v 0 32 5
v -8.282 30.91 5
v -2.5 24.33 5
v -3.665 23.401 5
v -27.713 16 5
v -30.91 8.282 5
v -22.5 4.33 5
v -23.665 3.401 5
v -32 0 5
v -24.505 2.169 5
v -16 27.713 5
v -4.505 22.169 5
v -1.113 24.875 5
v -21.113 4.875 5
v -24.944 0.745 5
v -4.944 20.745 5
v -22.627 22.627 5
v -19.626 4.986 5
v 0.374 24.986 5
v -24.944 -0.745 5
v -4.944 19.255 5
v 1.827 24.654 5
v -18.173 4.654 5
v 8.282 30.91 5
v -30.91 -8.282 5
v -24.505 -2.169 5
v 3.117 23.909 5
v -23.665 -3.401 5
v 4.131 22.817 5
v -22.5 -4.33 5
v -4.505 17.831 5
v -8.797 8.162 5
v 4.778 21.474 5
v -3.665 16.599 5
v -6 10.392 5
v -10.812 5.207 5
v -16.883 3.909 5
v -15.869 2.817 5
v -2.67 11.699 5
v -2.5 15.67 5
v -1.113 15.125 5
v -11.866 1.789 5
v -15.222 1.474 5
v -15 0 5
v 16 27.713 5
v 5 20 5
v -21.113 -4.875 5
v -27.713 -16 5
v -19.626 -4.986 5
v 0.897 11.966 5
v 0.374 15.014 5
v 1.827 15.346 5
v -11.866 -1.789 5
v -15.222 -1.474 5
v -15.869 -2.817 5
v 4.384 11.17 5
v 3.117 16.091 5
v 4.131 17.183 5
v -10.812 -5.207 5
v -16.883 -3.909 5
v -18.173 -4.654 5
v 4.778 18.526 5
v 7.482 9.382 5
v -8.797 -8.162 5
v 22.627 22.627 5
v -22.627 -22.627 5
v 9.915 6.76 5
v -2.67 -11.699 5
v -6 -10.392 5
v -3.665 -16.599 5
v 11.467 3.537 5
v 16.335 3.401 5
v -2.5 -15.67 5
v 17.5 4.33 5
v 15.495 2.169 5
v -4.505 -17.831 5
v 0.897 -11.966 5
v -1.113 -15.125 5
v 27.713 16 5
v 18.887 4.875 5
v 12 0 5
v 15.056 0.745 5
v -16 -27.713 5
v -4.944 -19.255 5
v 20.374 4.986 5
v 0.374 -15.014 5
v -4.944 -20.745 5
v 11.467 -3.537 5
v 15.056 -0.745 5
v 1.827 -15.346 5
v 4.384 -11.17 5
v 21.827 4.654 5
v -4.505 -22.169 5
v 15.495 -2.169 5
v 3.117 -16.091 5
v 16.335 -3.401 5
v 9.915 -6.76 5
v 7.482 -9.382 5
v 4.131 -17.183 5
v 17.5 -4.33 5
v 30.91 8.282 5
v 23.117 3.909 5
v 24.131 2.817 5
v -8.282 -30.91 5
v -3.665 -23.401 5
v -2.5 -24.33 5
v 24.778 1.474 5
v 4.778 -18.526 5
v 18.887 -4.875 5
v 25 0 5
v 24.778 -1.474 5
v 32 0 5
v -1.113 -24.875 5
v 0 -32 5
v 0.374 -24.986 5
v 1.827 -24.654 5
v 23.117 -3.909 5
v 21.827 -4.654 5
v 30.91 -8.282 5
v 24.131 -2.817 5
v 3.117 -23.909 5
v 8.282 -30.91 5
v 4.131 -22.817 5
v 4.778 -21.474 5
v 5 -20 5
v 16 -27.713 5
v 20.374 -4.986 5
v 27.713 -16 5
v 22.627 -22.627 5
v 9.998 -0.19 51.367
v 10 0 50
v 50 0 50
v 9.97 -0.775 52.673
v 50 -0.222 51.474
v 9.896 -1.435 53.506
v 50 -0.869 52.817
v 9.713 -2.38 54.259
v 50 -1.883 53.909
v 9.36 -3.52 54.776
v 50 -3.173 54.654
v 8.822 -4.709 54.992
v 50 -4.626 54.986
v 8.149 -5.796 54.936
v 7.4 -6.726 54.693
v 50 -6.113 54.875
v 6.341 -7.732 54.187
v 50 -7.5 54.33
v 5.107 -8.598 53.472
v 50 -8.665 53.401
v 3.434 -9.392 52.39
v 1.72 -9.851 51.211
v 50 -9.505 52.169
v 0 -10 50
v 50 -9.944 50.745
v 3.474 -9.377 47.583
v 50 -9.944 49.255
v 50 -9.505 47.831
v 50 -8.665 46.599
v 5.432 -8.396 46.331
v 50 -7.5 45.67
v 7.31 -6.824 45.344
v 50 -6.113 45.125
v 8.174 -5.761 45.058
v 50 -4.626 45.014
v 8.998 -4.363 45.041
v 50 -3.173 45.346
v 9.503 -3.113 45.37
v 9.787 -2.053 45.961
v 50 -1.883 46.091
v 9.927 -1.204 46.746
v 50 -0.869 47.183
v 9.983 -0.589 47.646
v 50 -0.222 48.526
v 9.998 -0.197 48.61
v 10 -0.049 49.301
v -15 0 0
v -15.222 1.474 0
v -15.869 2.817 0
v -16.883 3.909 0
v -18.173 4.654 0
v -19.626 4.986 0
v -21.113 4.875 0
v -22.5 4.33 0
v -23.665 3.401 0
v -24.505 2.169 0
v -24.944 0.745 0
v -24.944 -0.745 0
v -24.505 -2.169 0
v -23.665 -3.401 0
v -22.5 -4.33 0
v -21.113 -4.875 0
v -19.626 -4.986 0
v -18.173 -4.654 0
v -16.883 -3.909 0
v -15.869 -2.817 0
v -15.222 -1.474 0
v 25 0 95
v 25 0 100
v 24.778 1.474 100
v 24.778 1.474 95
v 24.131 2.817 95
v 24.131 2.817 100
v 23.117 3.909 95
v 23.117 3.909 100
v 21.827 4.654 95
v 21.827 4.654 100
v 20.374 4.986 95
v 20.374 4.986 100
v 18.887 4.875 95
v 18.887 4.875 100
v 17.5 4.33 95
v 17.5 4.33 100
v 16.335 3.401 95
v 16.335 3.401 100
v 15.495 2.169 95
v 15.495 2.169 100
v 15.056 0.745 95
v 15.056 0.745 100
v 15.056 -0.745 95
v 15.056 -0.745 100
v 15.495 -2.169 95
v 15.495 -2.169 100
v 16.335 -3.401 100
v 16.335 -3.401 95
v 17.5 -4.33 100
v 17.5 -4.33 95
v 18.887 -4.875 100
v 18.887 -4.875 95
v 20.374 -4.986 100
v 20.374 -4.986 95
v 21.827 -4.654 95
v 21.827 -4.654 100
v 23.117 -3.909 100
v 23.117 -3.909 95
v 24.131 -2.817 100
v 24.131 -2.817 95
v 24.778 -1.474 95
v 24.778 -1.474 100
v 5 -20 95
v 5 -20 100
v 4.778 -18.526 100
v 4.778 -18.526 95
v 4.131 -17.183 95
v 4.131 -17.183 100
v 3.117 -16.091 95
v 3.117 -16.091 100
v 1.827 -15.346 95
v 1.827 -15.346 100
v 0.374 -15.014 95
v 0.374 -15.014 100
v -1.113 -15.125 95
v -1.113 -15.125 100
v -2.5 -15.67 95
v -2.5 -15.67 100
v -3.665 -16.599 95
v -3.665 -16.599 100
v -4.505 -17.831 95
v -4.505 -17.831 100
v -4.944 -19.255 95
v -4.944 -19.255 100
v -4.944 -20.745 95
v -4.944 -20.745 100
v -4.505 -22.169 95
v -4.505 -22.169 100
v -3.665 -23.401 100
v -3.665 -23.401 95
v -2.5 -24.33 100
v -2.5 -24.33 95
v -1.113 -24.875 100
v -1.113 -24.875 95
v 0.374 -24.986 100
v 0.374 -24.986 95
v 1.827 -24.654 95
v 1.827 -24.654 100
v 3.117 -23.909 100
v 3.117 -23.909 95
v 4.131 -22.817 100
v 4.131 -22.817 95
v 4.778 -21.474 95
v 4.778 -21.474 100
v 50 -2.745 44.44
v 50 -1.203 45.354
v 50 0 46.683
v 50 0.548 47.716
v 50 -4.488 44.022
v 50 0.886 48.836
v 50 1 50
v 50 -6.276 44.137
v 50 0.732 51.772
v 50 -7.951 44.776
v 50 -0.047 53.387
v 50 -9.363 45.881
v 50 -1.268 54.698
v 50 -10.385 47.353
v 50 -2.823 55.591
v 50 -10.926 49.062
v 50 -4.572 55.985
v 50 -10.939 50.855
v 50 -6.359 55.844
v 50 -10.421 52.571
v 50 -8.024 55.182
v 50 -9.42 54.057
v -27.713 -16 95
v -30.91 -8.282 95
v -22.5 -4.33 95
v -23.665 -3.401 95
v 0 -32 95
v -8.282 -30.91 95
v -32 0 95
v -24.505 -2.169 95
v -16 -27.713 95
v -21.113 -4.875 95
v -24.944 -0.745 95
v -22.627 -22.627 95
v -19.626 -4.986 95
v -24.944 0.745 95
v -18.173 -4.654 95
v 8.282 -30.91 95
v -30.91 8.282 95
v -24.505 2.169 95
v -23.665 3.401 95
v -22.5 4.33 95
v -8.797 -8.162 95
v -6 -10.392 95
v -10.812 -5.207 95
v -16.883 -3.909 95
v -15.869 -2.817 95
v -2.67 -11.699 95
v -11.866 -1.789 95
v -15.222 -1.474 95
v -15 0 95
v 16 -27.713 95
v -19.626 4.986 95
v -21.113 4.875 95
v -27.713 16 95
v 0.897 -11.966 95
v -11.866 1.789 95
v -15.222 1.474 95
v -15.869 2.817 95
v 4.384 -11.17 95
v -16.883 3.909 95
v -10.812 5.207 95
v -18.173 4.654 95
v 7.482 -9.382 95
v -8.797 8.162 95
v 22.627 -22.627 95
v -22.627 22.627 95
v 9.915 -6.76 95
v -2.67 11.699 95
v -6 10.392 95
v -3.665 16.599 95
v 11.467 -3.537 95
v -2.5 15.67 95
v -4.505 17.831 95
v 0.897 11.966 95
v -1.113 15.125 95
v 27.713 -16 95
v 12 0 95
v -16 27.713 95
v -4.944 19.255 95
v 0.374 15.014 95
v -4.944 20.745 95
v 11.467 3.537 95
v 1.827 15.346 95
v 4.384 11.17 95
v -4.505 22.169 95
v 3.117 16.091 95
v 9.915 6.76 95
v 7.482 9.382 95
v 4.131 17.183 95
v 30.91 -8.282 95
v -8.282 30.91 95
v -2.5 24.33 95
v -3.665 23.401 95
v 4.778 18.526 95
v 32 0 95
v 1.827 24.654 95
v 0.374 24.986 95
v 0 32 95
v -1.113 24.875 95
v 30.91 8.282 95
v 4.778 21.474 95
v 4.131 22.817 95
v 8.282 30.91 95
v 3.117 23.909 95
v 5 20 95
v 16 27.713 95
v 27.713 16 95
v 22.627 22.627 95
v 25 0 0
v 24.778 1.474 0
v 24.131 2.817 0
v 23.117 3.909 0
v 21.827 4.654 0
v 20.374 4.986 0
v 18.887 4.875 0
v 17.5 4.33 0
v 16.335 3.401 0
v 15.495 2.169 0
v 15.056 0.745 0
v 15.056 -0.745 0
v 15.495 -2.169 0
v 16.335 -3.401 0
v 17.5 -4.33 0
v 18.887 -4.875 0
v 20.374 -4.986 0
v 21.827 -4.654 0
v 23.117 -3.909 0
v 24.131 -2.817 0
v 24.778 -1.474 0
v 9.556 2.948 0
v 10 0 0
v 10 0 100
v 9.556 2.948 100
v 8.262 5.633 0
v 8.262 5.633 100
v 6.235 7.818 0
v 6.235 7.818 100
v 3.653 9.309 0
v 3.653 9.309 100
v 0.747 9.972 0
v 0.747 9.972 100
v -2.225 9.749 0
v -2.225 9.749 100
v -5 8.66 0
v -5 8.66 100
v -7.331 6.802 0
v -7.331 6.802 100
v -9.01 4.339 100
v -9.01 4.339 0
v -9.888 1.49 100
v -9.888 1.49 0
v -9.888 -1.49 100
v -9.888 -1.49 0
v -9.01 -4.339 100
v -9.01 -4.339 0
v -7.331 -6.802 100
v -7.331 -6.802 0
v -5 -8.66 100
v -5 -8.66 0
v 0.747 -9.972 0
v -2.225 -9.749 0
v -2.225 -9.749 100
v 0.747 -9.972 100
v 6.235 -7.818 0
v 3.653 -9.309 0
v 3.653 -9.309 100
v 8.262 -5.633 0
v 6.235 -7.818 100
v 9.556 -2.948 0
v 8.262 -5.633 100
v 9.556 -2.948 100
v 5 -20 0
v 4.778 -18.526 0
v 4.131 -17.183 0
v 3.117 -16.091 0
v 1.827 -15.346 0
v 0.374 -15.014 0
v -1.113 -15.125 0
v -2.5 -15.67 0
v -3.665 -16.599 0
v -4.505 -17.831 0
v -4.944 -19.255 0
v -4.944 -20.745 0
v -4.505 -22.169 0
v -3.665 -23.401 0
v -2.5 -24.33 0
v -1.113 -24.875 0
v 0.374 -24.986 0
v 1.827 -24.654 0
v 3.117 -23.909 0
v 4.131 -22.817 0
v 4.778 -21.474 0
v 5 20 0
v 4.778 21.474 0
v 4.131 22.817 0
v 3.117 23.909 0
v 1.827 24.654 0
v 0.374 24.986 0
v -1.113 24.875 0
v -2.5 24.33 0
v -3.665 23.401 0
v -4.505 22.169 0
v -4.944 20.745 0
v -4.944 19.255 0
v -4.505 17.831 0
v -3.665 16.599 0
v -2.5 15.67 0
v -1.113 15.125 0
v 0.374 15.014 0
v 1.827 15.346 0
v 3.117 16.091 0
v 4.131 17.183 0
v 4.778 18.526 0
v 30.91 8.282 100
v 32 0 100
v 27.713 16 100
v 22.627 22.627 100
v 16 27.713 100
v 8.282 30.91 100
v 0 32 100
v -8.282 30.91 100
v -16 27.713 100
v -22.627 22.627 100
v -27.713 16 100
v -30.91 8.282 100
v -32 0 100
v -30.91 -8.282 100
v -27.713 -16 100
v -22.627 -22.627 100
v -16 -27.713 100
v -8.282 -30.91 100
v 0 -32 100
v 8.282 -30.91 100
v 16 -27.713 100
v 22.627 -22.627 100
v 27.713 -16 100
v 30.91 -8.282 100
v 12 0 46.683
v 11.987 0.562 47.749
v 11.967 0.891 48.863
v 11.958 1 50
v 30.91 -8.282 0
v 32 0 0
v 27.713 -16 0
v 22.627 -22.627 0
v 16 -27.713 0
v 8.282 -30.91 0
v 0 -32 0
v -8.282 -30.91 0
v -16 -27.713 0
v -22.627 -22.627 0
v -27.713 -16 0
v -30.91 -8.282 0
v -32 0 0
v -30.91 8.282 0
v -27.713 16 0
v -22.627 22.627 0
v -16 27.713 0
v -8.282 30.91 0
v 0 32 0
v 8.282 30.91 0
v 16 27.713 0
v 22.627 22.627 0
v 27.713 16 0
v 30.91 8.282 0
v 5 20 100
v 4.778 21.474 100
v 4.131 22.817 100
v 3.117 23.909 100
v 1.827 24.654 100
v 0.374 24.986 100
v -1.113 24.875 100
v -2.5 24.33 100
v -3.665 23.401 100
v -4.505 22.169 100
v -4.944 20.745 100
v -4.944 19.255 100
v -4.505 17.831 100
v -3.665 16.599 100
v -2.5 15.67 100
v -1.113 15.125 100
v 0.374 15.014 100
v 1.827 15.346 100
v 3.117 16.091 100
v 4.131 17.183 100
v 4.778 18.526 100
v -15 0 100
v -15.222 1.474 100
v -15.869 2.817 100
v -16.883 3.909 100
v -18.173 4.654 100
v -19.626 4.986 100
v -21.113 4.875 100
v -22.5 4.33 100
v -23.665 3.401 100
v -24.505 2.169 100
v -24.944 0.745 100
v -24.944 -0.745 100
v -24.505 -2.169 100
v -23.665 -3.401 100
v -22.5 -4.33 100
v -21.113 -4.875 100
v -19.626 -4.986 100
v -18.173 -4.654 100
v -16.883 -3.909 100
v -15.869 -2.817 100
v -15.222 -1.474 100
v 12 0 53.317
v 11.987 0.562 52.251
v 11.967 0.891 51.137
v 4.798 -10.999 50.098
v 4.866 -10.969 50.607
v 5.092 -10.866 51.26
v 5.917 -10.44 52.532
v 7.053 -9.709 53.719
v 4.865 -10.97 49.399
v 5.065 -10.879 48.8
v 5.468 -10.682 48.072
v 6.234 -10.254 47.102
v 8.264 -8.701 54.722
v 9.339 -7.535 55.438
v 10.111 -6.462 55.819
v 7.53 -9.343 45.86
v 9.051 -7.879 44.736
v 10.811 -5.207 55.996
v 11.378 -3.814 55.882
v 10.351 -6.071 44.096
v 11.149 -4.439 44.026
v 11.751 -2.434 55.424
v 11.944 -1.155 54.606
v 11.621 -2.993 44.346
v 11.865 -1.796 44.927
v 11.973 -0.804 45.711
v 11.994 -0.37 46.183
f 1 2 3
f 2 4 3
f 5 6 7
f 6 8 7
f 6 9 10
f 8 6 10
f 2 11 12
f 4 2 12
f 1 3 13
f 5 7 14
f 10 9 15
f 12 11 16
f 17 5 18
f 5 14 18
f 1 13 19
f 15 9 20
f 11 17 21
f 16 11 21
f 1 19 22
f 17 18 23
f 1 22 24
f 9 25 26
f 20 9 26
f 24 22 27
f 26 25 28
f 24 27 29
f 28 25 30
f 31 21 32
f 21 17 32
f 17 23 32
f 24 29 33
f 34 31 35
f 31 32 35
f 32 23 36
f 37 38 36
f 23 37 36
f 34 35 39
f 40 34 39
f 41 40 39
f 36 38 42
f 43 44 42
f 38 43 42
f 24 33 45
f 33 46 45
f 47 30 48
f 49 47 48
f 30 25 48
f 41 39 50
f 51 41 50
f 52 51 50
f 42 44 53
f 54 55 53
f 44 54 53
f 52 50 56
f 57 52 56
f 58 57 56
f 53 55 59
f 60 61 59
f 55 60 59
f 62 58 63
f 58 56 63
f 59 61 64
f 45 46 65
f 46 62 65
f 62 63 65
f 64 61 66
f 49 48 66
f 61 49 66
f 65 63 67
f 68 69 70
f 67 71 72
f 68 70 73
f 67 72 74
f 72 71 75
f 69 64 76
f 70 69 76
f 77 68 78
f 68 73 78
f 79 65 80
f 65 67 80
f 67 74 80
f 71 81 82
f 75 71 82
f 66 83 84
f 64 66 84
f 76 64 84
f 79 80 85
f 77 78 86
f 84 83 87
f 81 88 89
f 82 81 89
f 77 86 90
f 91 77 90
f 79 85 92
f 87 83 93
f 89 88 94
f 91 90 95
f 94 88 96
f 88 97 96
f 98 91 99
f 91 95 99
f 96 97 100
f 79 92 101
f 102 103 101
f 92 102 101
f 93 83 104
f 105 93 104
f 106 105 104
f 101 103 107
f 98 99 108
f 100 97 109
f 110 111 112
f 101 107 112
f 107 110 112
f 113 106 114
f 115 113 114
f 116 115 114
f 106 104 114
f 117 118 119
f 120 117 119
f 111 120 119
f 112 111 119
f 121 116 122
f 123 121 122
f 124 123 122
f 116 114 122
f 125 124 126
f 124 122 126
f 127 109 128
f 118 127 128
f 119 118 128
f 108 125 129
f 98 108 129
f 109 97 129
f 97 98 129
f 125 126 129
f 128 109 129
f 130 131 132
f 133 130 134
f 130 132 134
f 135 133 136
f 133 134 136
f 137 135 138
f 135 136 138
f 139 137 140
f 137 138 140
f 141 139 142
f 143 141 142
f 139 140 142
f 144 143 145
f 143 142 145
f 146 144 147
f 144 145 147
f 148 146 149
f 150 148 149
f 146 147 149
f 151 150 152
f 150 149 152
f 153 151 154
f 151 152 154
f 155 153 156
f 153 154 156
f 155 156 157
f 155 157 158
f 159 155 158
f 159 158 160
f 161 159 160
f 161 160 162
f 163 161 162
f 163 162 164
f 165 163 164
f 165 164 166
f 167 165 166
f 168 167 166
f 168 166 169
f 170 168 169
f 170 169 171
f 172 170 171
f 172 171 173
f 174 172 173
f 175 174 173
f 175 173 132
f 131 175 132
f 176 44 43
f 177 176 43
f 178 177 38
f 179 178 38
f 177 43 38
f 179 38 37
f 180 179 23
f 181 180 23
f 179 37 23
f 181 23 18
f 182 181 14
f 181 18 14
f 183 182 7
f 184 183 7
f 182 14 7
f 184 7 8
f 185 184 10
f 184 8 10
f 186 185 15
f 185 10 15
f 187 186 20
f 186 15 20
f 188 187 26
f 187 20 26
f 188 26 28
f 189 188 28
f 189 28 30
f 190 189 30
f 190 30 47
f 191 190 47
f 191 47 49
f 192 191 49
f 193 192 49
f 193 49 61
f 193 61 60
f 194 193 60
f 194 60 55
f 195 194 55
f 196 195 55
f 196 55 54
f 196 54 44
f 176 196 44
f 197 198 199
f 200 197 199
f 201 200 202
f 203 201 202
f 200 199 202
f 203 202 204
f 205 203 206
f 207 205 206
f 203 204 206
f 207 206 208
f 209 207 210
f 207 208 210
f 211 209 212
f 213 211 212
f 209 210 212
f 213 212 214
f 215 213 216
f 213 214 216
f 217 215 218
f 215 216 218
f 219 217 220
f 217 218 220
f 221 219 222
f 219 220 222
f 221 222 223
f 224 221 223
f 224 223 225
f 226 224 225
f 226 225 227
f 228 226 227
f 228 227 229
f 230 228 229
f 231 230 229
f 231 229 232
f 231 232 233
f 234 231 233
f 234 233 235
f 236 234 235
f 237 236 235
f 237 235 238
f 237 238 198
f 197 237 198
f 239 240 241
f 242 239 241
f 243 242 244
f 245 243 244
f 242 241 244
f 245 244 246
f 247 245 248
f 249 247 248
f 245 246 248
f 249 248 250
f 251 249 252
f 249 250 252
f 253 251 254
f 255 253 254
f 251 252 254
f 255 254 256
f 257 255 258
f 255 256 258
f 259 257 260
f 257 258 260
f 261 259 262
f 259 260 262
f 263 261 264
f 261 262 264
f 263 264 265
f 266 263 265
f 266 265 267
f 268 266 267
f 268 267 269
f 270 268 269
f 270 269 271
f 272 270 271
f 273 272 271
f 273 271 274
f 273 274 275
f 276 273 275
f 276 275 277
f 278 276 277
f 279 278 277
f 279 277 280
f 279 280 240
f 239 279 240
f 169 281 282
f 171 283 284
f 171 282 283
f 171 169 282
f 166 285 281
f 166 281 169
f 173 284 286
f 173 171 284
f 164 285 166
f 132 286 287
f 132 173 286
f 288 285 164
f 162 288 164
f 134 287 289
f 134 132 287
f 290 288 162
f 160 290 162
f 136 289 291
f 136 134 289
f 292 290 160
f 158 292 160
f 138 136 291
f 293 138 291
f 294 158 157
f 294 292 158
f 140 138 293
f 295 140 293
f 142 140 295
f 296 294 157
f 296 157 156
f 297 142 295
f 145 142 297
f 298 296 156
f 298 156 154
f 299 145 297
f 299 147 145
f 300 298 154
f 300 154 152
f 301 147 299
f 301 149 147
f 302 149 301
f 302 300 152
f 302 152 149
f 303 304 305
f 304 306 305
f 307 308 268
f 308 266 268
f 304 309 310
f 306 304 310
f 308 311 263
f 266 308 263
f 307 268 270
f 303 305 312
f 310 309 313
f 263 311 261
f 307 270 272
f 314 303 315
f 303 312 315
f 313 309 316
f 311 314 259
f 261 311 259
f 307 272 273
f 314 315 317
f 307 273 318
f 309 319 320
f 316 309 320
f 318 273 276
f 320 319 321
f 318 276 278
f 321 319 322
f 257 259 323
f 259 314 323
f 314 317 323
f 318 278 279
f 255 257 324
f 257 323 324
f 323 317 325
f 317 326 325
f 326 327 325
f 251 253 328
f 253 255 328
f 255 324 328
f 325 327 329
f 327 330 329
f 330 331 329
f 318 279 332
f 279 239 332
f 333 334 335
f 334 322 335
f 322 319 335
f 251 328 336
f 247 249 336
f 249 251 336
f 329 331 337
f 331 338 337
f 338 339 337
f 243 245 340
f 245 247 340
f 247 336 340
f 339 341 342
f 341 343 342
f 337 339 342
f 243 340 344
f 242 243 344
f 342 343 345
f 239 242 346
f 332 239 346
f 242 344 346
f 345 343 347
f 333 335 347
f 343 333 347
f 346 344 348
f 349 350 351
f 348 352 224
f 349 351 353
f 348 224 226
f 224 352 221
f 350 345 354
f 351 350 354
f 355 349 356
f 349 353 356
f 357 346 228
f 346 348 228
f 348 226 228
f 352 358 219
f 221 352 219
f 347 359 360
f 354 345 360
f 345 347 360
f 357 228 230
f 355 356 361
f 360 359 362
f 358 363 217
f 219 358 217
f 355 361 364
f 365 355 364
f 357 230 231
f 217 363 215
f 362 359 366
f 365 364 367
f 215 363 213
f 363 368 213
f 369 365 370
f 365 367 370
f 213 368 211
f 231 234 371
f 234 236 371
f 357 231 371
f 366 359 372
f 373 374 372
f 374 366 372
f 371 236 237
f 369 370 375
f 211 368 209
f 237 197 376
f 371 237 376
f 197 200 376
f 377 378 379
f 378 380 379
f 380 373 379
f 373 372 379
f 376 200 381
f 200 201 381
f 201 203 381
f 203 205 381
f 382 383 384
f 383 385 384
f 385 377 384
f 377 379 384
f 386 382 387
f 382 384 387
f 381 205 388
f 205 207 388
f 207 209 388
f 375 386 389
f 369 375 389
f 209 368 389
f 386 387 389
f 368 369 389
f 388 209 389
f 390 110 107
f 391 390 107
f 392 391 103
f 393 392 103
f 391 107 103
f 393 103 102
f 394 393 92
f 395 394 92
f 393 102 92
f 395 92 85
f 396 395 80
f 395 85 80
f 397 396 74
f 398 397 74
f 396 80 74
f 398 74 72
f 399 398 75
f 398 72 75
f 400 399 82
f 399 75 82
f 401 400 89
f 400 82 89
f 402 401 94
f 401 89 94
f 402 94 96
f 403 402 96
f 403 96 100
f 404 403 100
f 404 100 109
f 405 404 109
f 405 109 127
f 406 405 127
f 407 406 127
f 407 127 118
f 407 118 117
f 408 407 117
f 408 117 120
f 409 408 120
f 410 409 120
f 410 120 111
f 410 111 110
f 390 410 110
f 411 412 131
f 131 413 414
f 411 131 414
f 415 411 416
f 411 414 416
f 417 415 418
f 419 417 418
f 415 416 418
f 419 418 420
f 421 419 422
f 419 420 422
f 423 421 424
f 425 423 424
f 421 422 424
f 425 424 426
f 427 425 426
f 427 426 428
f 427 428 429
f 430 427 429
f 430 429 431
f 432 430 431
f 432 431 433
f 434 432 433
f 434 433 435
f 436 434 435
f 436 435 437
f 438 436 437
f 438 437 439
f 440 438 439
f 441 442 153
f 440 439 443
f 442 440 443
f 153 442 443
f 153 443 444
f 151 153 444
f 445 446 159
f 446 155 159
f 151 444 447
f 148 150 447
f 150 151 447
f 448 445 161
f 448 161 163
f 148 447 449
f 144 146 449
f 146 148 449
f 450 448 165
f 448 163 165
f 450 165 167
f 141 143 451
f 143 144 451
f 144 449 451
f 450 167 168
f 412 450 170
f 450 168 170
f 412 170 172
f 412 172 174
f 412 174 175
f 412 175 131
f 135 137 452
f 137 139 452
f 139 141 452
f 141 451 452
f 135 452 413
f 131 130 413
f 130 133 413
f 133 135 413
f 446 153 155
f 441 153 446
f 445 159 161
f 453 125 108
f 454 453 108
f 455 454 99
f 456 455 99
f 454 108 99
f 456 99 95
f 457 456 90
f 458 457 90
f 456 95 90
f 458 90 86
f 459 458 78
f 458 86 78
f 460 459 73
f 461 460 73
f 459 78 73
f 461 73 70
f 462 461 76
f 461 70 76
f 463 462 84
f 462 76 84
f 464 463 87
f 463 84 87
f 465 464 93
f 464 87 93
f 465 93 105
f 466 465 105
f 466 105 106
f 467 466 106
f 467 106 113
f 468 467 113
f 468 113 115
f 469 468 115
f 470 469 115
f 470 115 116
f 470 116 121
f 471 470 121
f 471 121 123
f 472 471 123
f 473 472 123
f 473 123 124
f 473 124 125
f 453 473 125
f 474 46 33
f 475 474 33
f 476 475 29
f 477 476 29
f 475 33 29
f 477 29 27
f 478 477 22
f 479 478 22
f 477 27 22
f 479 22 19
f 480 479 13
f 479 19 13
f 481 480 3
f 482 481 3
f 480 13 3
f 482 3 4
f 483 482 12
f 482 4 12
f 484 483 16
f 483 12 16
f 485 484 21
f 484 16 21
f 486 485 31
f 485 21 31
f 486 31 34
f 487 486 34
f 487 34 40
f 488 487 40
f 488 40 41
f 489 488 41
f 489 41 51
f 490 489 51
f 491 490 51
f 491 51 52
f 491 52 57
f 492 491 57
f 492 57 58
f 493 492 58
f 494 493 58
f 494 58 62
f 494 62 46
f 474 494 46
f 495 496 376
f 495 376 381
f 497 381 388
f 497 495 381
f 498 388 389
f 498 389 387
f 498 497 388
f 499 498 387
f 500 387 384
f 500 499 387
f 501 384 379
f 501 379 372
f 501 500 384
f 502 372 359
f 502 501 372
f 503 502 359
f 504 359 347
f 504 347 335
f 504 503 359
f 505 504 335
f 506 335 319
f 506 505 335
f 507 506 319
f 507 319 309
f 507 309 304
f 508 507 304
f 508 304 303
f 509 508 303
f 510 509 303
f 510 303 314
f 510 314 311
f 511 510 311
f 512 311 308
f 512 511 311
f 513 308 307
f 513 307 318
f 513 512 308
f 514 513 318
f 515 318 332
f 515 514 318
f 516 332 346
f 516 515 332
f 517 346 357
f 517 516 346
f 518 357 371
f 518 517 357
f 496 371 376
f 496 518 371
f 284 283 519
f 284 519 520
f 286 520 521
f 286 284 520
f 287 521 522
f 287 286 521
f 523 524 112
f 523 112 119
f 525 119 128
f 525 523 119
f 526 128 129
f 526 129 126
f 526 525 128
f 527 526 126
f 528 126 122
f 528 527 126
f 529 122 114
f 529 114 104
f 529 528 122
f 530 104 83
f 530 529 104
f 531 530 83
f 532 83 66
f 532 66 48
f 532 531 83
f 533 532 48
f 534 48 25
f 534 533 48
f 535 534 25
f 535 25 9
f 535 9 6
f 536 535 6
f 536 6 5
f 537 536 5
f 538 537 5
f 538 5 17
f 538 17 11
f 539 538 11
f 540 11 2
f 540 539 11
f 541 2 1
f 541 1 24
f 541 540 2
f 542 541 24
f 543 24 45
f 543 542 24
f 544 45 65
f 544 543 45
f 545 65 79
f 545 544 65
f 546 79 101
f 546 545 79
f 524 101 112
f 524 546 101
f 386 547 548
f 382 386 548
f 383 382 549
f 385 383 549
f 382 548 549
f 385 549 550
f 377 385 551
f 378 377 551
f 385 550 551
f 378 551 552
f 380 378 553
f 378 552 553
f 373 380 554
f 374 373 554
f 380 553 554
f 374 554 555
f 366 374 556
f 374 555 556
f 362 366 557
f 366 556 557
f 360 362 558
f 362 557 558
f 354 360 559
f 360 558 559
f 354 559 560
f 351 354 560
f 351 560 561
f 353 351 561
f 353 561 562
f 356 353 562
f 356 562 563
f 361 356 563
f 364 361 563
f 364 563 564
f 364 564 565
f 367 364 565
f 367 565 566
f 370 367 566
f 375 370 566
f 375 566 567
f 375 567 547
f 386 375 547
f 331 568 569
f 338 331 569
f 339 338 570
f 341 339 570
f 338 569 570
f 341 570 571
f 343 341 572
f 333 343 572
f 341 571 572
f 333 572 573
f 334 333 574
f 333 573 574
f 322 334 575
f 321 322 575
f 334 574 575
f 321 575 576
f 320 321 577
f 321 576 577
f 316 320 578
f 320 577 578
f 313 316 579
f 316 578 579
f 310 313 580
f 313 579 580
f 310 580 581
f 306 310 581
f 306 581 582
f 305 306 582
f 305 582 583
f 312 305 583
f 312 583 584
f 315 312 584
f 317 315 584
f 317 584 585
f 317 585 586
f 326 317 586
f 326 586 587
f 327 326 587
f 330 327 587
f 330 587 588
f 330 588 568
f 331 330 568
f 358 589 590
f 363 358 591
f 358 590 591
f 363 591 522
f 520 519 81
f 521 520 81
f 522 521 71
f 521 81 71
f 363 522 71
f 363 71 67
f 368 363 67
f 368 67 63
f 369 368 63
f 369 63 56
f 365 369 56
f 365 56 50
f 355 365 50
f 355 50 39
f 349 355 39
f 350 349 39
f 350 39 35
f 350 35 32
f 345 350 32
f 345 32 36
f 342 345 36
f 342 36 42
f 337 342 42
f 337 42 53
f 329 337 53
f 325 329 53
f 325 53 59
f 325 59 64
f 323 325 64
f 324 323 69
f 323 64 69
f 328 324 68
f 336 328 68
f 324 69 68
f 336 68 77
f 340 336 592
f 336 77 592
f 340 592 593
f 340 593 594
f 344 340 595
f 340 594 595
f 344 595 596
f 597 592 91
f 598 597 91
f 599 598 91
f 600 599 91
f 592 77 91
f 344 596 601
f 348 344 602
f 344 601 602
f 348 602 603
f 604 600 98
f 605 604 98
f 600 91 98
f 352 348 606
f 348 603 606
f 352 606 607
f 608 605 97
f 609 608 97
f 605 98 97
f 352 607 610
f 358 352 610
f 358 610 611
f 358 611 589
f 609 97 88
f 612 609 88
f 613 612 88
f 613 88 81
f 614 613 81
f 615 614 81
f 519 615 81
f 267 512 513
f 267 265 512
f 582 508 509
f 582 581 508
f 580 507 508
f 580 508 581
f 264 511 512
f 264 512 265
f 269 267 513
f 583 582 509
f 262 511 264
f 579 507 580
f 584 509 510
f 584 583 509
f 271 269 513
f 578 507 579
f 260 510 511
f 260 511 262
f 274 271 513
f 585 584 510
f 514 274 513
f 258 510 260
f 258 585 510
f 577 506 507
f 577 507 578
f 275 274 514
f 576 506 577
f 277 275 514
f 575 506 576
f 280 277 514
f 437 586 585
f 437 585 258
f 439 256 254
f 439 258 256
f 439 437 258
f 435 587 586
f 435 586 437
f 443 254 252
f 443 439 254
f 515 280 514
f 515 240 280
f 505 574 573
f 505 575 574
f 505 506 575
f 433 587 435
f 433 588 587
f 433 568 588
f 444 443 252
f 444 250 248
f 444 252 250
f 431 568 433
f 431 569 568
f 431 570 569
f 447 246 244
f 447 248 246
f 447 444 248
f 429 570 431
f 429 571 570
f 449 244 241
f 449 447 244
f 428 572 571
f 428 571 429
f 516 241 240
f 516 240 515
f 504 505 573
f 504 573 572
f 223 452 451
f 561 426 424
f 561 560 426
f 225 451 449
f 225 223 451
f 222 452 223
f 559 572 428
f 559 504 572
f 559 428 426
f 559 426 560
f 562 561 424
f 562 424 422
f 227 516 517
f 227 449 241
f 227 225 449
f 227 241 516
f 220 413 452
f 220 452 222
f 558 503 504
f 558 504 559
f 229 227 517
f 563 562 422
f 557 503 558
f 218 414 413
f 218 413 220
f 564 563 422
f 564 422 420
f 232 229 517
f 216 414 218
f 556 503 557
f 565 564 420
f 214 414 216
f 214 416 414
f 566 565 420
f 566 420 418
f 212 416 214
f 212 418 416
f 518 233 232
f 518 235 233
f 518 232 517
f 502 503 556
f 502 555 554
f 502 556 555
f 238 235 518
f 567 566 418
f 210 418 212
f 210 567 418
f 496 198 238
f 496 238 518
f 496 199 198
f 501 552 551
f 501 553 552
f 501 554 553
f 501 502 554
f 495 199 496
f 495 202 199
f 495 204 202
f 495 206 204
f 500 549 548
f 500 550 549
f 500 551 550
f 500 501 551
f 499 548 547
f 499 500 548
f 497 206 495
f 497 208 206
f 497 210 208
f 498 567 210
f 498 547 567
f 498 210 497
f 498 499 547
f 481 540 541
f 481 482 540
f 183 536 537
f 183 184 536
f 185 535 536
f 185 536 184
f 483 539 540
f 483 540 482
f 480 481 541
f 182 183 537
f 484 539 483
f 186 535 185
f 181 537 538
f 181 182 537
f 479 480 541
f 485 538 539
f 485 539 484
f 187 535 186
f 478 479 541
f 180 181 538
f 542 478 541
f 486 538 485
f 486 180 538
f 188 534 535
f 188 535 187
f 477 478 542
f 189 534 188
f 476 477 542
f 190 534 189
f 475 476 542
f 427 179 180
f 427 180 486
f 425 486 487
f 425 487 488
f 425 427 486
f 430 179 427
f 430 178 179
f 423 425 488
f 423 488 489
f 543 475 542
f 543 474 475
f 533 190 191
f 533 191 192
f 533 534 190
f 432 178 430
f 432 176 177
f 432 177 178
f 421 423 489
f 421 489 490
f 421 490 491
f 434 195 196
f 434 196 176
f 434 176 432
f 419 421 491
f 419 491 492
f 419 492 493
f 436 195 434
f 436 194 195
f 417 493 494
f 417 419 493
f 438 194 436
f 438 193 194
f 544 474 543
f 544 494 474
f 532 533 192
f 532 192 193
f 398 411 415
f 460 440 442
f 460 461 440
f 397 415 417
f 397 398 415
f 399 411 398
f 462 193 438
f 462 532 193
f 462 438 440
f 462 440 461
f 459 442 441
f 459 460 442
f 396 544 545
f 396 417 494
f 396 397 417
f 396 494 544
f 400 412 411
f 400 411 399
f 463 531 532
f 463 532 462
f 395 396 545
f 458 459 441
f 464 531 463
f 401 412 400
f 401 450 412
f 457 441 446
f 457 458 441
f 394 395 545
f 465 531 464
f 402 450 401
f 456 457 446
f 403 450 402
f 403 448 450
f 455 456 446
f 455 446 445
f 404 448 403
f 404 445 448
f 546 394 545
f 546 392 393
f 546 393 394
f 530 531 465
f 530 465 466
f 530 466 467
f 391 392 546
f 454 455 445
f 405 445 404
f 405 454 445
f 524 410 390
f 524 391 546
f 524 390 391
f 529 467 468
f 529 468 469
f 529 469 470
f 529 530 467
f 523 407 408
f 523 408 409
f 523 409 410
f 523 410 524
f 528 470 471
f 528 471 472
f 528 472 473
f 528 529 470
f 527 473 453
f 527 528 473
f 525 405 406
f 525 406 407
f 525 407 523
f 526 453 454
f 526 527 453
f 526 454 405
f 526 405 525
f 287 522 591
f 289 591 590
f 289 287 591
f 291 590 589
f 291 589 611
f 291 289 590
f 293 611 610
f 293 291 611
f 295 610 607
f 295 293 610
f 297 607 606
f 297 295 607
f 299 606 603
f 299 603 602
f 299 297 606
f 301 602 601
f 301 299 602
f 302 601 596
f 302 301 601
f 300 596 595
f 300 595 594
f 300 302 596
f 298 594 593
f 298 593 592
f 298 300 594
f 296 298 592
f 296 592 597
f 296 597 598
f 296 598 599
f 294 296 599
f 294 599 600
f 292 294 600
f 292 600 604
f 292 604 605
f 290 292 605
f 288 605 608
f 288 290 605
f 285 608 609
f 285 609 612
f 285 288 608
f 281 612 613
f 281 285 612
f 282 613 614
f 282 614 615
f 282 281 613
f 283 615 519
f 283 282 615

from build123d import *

# Parameters (mm, degrees)
F0_R      = 12
F1_DEPTH  = 100
F2_R      = 10
F3_DEPTH  = 100
F4_R      = 32
F4_R_2    = 12
F5_DEPTH  = 5
F6_R      = 32
F6_R_2    = 12
F7_DEPTH  = 5
F8_R      = 5
F9_DEPTH  = 100
F14_R     = 5
F15_DEPTH = 50
F16_R     = 10
F17_DEPTH = 70


with BuildPart() as f1:
    # F0 (on Top) → F1 (new body)
    with BuildSketch(Plane.XY):
        Circle(F0_R)
    extrude(amount=F1_DEPTH)

    # F2 (on face) → F3 (cut, through all)
    with BuildSketch(Plane.XY.offset(100)):
        Circle(F2_R)
    extrude(amount=-F3_DEPTH, mode=Mode.SUBTRACT)

    # F4 (on face) → F5 (join)
    with BuildSketch(Plane(origin=(0, 0, 0), x_dir=(1, 0, 0), z_dir=(0, 0, -1))):
        Circle(F4_R)
        Circle(F4_R_2, mode=Mode.SUBTRACT)
    extrude(amount=-F5_DEPTH)

    # F6 (on face) → F7 (join)
    with BuildSketch(Plane.XY.offset(100)):
        Circle(F6_R)
        Circle(F6_R_2, mode=Mode.SUBTRACT)
    extrude(amount=-F7_DEPTH)

    # F8 (on face) → F9 (cut, through all)
    with BuildSketch(Plane.XY.offset(100)):
        with Locations((0, 20)):
            Circle(F8_R)
        with Locations((-20, 0)):
            Circle(F8_R)
        with Locations((0, -20)):
            Circle(F8_R)
        with Locations((20, 0)):
            Circle(F8_R)
    extrude(amount=-F9_DEPTH, mode=Mode.SUBTRACT)

    # F13: sweep along a path in F12
    with BuildLine(Plane.XZ.offset(5)) as f13_path:
        Line((0, 50), (50, 50))
    # F10 (on Right) → F13 (sweep)
    with BuildSketch(Plane.YZ):
        with BuildLine():
            ThreePointArc((0, 46.6833752096), (0.7445626465, 48.2679491924), (1, 50))
            ThreePointArc((1, 50), (-10.7445626465, 51.7320508076), (0, 46.6833752096))
        make_face()
    sweep(path=f13_path.line)

    # F14 (on face) → F15 (cut, through all)
    with BuildSketch(Plane.YZ.offset(50)):
        with Locations((-5, 50)):
            Circle(F14_R)
    extrude(amount=-F15_DEPTH, mode=Mode.SUBTRACT)

    # F16 (on face) → F17 (cut)
    with BuildSketch(Plane.XY.offset(100)):
        Circle(F16_R)
    extrude(amount=-F17_DEPTH, mode=Mode.SUBTRACT)


solid = f1.part
